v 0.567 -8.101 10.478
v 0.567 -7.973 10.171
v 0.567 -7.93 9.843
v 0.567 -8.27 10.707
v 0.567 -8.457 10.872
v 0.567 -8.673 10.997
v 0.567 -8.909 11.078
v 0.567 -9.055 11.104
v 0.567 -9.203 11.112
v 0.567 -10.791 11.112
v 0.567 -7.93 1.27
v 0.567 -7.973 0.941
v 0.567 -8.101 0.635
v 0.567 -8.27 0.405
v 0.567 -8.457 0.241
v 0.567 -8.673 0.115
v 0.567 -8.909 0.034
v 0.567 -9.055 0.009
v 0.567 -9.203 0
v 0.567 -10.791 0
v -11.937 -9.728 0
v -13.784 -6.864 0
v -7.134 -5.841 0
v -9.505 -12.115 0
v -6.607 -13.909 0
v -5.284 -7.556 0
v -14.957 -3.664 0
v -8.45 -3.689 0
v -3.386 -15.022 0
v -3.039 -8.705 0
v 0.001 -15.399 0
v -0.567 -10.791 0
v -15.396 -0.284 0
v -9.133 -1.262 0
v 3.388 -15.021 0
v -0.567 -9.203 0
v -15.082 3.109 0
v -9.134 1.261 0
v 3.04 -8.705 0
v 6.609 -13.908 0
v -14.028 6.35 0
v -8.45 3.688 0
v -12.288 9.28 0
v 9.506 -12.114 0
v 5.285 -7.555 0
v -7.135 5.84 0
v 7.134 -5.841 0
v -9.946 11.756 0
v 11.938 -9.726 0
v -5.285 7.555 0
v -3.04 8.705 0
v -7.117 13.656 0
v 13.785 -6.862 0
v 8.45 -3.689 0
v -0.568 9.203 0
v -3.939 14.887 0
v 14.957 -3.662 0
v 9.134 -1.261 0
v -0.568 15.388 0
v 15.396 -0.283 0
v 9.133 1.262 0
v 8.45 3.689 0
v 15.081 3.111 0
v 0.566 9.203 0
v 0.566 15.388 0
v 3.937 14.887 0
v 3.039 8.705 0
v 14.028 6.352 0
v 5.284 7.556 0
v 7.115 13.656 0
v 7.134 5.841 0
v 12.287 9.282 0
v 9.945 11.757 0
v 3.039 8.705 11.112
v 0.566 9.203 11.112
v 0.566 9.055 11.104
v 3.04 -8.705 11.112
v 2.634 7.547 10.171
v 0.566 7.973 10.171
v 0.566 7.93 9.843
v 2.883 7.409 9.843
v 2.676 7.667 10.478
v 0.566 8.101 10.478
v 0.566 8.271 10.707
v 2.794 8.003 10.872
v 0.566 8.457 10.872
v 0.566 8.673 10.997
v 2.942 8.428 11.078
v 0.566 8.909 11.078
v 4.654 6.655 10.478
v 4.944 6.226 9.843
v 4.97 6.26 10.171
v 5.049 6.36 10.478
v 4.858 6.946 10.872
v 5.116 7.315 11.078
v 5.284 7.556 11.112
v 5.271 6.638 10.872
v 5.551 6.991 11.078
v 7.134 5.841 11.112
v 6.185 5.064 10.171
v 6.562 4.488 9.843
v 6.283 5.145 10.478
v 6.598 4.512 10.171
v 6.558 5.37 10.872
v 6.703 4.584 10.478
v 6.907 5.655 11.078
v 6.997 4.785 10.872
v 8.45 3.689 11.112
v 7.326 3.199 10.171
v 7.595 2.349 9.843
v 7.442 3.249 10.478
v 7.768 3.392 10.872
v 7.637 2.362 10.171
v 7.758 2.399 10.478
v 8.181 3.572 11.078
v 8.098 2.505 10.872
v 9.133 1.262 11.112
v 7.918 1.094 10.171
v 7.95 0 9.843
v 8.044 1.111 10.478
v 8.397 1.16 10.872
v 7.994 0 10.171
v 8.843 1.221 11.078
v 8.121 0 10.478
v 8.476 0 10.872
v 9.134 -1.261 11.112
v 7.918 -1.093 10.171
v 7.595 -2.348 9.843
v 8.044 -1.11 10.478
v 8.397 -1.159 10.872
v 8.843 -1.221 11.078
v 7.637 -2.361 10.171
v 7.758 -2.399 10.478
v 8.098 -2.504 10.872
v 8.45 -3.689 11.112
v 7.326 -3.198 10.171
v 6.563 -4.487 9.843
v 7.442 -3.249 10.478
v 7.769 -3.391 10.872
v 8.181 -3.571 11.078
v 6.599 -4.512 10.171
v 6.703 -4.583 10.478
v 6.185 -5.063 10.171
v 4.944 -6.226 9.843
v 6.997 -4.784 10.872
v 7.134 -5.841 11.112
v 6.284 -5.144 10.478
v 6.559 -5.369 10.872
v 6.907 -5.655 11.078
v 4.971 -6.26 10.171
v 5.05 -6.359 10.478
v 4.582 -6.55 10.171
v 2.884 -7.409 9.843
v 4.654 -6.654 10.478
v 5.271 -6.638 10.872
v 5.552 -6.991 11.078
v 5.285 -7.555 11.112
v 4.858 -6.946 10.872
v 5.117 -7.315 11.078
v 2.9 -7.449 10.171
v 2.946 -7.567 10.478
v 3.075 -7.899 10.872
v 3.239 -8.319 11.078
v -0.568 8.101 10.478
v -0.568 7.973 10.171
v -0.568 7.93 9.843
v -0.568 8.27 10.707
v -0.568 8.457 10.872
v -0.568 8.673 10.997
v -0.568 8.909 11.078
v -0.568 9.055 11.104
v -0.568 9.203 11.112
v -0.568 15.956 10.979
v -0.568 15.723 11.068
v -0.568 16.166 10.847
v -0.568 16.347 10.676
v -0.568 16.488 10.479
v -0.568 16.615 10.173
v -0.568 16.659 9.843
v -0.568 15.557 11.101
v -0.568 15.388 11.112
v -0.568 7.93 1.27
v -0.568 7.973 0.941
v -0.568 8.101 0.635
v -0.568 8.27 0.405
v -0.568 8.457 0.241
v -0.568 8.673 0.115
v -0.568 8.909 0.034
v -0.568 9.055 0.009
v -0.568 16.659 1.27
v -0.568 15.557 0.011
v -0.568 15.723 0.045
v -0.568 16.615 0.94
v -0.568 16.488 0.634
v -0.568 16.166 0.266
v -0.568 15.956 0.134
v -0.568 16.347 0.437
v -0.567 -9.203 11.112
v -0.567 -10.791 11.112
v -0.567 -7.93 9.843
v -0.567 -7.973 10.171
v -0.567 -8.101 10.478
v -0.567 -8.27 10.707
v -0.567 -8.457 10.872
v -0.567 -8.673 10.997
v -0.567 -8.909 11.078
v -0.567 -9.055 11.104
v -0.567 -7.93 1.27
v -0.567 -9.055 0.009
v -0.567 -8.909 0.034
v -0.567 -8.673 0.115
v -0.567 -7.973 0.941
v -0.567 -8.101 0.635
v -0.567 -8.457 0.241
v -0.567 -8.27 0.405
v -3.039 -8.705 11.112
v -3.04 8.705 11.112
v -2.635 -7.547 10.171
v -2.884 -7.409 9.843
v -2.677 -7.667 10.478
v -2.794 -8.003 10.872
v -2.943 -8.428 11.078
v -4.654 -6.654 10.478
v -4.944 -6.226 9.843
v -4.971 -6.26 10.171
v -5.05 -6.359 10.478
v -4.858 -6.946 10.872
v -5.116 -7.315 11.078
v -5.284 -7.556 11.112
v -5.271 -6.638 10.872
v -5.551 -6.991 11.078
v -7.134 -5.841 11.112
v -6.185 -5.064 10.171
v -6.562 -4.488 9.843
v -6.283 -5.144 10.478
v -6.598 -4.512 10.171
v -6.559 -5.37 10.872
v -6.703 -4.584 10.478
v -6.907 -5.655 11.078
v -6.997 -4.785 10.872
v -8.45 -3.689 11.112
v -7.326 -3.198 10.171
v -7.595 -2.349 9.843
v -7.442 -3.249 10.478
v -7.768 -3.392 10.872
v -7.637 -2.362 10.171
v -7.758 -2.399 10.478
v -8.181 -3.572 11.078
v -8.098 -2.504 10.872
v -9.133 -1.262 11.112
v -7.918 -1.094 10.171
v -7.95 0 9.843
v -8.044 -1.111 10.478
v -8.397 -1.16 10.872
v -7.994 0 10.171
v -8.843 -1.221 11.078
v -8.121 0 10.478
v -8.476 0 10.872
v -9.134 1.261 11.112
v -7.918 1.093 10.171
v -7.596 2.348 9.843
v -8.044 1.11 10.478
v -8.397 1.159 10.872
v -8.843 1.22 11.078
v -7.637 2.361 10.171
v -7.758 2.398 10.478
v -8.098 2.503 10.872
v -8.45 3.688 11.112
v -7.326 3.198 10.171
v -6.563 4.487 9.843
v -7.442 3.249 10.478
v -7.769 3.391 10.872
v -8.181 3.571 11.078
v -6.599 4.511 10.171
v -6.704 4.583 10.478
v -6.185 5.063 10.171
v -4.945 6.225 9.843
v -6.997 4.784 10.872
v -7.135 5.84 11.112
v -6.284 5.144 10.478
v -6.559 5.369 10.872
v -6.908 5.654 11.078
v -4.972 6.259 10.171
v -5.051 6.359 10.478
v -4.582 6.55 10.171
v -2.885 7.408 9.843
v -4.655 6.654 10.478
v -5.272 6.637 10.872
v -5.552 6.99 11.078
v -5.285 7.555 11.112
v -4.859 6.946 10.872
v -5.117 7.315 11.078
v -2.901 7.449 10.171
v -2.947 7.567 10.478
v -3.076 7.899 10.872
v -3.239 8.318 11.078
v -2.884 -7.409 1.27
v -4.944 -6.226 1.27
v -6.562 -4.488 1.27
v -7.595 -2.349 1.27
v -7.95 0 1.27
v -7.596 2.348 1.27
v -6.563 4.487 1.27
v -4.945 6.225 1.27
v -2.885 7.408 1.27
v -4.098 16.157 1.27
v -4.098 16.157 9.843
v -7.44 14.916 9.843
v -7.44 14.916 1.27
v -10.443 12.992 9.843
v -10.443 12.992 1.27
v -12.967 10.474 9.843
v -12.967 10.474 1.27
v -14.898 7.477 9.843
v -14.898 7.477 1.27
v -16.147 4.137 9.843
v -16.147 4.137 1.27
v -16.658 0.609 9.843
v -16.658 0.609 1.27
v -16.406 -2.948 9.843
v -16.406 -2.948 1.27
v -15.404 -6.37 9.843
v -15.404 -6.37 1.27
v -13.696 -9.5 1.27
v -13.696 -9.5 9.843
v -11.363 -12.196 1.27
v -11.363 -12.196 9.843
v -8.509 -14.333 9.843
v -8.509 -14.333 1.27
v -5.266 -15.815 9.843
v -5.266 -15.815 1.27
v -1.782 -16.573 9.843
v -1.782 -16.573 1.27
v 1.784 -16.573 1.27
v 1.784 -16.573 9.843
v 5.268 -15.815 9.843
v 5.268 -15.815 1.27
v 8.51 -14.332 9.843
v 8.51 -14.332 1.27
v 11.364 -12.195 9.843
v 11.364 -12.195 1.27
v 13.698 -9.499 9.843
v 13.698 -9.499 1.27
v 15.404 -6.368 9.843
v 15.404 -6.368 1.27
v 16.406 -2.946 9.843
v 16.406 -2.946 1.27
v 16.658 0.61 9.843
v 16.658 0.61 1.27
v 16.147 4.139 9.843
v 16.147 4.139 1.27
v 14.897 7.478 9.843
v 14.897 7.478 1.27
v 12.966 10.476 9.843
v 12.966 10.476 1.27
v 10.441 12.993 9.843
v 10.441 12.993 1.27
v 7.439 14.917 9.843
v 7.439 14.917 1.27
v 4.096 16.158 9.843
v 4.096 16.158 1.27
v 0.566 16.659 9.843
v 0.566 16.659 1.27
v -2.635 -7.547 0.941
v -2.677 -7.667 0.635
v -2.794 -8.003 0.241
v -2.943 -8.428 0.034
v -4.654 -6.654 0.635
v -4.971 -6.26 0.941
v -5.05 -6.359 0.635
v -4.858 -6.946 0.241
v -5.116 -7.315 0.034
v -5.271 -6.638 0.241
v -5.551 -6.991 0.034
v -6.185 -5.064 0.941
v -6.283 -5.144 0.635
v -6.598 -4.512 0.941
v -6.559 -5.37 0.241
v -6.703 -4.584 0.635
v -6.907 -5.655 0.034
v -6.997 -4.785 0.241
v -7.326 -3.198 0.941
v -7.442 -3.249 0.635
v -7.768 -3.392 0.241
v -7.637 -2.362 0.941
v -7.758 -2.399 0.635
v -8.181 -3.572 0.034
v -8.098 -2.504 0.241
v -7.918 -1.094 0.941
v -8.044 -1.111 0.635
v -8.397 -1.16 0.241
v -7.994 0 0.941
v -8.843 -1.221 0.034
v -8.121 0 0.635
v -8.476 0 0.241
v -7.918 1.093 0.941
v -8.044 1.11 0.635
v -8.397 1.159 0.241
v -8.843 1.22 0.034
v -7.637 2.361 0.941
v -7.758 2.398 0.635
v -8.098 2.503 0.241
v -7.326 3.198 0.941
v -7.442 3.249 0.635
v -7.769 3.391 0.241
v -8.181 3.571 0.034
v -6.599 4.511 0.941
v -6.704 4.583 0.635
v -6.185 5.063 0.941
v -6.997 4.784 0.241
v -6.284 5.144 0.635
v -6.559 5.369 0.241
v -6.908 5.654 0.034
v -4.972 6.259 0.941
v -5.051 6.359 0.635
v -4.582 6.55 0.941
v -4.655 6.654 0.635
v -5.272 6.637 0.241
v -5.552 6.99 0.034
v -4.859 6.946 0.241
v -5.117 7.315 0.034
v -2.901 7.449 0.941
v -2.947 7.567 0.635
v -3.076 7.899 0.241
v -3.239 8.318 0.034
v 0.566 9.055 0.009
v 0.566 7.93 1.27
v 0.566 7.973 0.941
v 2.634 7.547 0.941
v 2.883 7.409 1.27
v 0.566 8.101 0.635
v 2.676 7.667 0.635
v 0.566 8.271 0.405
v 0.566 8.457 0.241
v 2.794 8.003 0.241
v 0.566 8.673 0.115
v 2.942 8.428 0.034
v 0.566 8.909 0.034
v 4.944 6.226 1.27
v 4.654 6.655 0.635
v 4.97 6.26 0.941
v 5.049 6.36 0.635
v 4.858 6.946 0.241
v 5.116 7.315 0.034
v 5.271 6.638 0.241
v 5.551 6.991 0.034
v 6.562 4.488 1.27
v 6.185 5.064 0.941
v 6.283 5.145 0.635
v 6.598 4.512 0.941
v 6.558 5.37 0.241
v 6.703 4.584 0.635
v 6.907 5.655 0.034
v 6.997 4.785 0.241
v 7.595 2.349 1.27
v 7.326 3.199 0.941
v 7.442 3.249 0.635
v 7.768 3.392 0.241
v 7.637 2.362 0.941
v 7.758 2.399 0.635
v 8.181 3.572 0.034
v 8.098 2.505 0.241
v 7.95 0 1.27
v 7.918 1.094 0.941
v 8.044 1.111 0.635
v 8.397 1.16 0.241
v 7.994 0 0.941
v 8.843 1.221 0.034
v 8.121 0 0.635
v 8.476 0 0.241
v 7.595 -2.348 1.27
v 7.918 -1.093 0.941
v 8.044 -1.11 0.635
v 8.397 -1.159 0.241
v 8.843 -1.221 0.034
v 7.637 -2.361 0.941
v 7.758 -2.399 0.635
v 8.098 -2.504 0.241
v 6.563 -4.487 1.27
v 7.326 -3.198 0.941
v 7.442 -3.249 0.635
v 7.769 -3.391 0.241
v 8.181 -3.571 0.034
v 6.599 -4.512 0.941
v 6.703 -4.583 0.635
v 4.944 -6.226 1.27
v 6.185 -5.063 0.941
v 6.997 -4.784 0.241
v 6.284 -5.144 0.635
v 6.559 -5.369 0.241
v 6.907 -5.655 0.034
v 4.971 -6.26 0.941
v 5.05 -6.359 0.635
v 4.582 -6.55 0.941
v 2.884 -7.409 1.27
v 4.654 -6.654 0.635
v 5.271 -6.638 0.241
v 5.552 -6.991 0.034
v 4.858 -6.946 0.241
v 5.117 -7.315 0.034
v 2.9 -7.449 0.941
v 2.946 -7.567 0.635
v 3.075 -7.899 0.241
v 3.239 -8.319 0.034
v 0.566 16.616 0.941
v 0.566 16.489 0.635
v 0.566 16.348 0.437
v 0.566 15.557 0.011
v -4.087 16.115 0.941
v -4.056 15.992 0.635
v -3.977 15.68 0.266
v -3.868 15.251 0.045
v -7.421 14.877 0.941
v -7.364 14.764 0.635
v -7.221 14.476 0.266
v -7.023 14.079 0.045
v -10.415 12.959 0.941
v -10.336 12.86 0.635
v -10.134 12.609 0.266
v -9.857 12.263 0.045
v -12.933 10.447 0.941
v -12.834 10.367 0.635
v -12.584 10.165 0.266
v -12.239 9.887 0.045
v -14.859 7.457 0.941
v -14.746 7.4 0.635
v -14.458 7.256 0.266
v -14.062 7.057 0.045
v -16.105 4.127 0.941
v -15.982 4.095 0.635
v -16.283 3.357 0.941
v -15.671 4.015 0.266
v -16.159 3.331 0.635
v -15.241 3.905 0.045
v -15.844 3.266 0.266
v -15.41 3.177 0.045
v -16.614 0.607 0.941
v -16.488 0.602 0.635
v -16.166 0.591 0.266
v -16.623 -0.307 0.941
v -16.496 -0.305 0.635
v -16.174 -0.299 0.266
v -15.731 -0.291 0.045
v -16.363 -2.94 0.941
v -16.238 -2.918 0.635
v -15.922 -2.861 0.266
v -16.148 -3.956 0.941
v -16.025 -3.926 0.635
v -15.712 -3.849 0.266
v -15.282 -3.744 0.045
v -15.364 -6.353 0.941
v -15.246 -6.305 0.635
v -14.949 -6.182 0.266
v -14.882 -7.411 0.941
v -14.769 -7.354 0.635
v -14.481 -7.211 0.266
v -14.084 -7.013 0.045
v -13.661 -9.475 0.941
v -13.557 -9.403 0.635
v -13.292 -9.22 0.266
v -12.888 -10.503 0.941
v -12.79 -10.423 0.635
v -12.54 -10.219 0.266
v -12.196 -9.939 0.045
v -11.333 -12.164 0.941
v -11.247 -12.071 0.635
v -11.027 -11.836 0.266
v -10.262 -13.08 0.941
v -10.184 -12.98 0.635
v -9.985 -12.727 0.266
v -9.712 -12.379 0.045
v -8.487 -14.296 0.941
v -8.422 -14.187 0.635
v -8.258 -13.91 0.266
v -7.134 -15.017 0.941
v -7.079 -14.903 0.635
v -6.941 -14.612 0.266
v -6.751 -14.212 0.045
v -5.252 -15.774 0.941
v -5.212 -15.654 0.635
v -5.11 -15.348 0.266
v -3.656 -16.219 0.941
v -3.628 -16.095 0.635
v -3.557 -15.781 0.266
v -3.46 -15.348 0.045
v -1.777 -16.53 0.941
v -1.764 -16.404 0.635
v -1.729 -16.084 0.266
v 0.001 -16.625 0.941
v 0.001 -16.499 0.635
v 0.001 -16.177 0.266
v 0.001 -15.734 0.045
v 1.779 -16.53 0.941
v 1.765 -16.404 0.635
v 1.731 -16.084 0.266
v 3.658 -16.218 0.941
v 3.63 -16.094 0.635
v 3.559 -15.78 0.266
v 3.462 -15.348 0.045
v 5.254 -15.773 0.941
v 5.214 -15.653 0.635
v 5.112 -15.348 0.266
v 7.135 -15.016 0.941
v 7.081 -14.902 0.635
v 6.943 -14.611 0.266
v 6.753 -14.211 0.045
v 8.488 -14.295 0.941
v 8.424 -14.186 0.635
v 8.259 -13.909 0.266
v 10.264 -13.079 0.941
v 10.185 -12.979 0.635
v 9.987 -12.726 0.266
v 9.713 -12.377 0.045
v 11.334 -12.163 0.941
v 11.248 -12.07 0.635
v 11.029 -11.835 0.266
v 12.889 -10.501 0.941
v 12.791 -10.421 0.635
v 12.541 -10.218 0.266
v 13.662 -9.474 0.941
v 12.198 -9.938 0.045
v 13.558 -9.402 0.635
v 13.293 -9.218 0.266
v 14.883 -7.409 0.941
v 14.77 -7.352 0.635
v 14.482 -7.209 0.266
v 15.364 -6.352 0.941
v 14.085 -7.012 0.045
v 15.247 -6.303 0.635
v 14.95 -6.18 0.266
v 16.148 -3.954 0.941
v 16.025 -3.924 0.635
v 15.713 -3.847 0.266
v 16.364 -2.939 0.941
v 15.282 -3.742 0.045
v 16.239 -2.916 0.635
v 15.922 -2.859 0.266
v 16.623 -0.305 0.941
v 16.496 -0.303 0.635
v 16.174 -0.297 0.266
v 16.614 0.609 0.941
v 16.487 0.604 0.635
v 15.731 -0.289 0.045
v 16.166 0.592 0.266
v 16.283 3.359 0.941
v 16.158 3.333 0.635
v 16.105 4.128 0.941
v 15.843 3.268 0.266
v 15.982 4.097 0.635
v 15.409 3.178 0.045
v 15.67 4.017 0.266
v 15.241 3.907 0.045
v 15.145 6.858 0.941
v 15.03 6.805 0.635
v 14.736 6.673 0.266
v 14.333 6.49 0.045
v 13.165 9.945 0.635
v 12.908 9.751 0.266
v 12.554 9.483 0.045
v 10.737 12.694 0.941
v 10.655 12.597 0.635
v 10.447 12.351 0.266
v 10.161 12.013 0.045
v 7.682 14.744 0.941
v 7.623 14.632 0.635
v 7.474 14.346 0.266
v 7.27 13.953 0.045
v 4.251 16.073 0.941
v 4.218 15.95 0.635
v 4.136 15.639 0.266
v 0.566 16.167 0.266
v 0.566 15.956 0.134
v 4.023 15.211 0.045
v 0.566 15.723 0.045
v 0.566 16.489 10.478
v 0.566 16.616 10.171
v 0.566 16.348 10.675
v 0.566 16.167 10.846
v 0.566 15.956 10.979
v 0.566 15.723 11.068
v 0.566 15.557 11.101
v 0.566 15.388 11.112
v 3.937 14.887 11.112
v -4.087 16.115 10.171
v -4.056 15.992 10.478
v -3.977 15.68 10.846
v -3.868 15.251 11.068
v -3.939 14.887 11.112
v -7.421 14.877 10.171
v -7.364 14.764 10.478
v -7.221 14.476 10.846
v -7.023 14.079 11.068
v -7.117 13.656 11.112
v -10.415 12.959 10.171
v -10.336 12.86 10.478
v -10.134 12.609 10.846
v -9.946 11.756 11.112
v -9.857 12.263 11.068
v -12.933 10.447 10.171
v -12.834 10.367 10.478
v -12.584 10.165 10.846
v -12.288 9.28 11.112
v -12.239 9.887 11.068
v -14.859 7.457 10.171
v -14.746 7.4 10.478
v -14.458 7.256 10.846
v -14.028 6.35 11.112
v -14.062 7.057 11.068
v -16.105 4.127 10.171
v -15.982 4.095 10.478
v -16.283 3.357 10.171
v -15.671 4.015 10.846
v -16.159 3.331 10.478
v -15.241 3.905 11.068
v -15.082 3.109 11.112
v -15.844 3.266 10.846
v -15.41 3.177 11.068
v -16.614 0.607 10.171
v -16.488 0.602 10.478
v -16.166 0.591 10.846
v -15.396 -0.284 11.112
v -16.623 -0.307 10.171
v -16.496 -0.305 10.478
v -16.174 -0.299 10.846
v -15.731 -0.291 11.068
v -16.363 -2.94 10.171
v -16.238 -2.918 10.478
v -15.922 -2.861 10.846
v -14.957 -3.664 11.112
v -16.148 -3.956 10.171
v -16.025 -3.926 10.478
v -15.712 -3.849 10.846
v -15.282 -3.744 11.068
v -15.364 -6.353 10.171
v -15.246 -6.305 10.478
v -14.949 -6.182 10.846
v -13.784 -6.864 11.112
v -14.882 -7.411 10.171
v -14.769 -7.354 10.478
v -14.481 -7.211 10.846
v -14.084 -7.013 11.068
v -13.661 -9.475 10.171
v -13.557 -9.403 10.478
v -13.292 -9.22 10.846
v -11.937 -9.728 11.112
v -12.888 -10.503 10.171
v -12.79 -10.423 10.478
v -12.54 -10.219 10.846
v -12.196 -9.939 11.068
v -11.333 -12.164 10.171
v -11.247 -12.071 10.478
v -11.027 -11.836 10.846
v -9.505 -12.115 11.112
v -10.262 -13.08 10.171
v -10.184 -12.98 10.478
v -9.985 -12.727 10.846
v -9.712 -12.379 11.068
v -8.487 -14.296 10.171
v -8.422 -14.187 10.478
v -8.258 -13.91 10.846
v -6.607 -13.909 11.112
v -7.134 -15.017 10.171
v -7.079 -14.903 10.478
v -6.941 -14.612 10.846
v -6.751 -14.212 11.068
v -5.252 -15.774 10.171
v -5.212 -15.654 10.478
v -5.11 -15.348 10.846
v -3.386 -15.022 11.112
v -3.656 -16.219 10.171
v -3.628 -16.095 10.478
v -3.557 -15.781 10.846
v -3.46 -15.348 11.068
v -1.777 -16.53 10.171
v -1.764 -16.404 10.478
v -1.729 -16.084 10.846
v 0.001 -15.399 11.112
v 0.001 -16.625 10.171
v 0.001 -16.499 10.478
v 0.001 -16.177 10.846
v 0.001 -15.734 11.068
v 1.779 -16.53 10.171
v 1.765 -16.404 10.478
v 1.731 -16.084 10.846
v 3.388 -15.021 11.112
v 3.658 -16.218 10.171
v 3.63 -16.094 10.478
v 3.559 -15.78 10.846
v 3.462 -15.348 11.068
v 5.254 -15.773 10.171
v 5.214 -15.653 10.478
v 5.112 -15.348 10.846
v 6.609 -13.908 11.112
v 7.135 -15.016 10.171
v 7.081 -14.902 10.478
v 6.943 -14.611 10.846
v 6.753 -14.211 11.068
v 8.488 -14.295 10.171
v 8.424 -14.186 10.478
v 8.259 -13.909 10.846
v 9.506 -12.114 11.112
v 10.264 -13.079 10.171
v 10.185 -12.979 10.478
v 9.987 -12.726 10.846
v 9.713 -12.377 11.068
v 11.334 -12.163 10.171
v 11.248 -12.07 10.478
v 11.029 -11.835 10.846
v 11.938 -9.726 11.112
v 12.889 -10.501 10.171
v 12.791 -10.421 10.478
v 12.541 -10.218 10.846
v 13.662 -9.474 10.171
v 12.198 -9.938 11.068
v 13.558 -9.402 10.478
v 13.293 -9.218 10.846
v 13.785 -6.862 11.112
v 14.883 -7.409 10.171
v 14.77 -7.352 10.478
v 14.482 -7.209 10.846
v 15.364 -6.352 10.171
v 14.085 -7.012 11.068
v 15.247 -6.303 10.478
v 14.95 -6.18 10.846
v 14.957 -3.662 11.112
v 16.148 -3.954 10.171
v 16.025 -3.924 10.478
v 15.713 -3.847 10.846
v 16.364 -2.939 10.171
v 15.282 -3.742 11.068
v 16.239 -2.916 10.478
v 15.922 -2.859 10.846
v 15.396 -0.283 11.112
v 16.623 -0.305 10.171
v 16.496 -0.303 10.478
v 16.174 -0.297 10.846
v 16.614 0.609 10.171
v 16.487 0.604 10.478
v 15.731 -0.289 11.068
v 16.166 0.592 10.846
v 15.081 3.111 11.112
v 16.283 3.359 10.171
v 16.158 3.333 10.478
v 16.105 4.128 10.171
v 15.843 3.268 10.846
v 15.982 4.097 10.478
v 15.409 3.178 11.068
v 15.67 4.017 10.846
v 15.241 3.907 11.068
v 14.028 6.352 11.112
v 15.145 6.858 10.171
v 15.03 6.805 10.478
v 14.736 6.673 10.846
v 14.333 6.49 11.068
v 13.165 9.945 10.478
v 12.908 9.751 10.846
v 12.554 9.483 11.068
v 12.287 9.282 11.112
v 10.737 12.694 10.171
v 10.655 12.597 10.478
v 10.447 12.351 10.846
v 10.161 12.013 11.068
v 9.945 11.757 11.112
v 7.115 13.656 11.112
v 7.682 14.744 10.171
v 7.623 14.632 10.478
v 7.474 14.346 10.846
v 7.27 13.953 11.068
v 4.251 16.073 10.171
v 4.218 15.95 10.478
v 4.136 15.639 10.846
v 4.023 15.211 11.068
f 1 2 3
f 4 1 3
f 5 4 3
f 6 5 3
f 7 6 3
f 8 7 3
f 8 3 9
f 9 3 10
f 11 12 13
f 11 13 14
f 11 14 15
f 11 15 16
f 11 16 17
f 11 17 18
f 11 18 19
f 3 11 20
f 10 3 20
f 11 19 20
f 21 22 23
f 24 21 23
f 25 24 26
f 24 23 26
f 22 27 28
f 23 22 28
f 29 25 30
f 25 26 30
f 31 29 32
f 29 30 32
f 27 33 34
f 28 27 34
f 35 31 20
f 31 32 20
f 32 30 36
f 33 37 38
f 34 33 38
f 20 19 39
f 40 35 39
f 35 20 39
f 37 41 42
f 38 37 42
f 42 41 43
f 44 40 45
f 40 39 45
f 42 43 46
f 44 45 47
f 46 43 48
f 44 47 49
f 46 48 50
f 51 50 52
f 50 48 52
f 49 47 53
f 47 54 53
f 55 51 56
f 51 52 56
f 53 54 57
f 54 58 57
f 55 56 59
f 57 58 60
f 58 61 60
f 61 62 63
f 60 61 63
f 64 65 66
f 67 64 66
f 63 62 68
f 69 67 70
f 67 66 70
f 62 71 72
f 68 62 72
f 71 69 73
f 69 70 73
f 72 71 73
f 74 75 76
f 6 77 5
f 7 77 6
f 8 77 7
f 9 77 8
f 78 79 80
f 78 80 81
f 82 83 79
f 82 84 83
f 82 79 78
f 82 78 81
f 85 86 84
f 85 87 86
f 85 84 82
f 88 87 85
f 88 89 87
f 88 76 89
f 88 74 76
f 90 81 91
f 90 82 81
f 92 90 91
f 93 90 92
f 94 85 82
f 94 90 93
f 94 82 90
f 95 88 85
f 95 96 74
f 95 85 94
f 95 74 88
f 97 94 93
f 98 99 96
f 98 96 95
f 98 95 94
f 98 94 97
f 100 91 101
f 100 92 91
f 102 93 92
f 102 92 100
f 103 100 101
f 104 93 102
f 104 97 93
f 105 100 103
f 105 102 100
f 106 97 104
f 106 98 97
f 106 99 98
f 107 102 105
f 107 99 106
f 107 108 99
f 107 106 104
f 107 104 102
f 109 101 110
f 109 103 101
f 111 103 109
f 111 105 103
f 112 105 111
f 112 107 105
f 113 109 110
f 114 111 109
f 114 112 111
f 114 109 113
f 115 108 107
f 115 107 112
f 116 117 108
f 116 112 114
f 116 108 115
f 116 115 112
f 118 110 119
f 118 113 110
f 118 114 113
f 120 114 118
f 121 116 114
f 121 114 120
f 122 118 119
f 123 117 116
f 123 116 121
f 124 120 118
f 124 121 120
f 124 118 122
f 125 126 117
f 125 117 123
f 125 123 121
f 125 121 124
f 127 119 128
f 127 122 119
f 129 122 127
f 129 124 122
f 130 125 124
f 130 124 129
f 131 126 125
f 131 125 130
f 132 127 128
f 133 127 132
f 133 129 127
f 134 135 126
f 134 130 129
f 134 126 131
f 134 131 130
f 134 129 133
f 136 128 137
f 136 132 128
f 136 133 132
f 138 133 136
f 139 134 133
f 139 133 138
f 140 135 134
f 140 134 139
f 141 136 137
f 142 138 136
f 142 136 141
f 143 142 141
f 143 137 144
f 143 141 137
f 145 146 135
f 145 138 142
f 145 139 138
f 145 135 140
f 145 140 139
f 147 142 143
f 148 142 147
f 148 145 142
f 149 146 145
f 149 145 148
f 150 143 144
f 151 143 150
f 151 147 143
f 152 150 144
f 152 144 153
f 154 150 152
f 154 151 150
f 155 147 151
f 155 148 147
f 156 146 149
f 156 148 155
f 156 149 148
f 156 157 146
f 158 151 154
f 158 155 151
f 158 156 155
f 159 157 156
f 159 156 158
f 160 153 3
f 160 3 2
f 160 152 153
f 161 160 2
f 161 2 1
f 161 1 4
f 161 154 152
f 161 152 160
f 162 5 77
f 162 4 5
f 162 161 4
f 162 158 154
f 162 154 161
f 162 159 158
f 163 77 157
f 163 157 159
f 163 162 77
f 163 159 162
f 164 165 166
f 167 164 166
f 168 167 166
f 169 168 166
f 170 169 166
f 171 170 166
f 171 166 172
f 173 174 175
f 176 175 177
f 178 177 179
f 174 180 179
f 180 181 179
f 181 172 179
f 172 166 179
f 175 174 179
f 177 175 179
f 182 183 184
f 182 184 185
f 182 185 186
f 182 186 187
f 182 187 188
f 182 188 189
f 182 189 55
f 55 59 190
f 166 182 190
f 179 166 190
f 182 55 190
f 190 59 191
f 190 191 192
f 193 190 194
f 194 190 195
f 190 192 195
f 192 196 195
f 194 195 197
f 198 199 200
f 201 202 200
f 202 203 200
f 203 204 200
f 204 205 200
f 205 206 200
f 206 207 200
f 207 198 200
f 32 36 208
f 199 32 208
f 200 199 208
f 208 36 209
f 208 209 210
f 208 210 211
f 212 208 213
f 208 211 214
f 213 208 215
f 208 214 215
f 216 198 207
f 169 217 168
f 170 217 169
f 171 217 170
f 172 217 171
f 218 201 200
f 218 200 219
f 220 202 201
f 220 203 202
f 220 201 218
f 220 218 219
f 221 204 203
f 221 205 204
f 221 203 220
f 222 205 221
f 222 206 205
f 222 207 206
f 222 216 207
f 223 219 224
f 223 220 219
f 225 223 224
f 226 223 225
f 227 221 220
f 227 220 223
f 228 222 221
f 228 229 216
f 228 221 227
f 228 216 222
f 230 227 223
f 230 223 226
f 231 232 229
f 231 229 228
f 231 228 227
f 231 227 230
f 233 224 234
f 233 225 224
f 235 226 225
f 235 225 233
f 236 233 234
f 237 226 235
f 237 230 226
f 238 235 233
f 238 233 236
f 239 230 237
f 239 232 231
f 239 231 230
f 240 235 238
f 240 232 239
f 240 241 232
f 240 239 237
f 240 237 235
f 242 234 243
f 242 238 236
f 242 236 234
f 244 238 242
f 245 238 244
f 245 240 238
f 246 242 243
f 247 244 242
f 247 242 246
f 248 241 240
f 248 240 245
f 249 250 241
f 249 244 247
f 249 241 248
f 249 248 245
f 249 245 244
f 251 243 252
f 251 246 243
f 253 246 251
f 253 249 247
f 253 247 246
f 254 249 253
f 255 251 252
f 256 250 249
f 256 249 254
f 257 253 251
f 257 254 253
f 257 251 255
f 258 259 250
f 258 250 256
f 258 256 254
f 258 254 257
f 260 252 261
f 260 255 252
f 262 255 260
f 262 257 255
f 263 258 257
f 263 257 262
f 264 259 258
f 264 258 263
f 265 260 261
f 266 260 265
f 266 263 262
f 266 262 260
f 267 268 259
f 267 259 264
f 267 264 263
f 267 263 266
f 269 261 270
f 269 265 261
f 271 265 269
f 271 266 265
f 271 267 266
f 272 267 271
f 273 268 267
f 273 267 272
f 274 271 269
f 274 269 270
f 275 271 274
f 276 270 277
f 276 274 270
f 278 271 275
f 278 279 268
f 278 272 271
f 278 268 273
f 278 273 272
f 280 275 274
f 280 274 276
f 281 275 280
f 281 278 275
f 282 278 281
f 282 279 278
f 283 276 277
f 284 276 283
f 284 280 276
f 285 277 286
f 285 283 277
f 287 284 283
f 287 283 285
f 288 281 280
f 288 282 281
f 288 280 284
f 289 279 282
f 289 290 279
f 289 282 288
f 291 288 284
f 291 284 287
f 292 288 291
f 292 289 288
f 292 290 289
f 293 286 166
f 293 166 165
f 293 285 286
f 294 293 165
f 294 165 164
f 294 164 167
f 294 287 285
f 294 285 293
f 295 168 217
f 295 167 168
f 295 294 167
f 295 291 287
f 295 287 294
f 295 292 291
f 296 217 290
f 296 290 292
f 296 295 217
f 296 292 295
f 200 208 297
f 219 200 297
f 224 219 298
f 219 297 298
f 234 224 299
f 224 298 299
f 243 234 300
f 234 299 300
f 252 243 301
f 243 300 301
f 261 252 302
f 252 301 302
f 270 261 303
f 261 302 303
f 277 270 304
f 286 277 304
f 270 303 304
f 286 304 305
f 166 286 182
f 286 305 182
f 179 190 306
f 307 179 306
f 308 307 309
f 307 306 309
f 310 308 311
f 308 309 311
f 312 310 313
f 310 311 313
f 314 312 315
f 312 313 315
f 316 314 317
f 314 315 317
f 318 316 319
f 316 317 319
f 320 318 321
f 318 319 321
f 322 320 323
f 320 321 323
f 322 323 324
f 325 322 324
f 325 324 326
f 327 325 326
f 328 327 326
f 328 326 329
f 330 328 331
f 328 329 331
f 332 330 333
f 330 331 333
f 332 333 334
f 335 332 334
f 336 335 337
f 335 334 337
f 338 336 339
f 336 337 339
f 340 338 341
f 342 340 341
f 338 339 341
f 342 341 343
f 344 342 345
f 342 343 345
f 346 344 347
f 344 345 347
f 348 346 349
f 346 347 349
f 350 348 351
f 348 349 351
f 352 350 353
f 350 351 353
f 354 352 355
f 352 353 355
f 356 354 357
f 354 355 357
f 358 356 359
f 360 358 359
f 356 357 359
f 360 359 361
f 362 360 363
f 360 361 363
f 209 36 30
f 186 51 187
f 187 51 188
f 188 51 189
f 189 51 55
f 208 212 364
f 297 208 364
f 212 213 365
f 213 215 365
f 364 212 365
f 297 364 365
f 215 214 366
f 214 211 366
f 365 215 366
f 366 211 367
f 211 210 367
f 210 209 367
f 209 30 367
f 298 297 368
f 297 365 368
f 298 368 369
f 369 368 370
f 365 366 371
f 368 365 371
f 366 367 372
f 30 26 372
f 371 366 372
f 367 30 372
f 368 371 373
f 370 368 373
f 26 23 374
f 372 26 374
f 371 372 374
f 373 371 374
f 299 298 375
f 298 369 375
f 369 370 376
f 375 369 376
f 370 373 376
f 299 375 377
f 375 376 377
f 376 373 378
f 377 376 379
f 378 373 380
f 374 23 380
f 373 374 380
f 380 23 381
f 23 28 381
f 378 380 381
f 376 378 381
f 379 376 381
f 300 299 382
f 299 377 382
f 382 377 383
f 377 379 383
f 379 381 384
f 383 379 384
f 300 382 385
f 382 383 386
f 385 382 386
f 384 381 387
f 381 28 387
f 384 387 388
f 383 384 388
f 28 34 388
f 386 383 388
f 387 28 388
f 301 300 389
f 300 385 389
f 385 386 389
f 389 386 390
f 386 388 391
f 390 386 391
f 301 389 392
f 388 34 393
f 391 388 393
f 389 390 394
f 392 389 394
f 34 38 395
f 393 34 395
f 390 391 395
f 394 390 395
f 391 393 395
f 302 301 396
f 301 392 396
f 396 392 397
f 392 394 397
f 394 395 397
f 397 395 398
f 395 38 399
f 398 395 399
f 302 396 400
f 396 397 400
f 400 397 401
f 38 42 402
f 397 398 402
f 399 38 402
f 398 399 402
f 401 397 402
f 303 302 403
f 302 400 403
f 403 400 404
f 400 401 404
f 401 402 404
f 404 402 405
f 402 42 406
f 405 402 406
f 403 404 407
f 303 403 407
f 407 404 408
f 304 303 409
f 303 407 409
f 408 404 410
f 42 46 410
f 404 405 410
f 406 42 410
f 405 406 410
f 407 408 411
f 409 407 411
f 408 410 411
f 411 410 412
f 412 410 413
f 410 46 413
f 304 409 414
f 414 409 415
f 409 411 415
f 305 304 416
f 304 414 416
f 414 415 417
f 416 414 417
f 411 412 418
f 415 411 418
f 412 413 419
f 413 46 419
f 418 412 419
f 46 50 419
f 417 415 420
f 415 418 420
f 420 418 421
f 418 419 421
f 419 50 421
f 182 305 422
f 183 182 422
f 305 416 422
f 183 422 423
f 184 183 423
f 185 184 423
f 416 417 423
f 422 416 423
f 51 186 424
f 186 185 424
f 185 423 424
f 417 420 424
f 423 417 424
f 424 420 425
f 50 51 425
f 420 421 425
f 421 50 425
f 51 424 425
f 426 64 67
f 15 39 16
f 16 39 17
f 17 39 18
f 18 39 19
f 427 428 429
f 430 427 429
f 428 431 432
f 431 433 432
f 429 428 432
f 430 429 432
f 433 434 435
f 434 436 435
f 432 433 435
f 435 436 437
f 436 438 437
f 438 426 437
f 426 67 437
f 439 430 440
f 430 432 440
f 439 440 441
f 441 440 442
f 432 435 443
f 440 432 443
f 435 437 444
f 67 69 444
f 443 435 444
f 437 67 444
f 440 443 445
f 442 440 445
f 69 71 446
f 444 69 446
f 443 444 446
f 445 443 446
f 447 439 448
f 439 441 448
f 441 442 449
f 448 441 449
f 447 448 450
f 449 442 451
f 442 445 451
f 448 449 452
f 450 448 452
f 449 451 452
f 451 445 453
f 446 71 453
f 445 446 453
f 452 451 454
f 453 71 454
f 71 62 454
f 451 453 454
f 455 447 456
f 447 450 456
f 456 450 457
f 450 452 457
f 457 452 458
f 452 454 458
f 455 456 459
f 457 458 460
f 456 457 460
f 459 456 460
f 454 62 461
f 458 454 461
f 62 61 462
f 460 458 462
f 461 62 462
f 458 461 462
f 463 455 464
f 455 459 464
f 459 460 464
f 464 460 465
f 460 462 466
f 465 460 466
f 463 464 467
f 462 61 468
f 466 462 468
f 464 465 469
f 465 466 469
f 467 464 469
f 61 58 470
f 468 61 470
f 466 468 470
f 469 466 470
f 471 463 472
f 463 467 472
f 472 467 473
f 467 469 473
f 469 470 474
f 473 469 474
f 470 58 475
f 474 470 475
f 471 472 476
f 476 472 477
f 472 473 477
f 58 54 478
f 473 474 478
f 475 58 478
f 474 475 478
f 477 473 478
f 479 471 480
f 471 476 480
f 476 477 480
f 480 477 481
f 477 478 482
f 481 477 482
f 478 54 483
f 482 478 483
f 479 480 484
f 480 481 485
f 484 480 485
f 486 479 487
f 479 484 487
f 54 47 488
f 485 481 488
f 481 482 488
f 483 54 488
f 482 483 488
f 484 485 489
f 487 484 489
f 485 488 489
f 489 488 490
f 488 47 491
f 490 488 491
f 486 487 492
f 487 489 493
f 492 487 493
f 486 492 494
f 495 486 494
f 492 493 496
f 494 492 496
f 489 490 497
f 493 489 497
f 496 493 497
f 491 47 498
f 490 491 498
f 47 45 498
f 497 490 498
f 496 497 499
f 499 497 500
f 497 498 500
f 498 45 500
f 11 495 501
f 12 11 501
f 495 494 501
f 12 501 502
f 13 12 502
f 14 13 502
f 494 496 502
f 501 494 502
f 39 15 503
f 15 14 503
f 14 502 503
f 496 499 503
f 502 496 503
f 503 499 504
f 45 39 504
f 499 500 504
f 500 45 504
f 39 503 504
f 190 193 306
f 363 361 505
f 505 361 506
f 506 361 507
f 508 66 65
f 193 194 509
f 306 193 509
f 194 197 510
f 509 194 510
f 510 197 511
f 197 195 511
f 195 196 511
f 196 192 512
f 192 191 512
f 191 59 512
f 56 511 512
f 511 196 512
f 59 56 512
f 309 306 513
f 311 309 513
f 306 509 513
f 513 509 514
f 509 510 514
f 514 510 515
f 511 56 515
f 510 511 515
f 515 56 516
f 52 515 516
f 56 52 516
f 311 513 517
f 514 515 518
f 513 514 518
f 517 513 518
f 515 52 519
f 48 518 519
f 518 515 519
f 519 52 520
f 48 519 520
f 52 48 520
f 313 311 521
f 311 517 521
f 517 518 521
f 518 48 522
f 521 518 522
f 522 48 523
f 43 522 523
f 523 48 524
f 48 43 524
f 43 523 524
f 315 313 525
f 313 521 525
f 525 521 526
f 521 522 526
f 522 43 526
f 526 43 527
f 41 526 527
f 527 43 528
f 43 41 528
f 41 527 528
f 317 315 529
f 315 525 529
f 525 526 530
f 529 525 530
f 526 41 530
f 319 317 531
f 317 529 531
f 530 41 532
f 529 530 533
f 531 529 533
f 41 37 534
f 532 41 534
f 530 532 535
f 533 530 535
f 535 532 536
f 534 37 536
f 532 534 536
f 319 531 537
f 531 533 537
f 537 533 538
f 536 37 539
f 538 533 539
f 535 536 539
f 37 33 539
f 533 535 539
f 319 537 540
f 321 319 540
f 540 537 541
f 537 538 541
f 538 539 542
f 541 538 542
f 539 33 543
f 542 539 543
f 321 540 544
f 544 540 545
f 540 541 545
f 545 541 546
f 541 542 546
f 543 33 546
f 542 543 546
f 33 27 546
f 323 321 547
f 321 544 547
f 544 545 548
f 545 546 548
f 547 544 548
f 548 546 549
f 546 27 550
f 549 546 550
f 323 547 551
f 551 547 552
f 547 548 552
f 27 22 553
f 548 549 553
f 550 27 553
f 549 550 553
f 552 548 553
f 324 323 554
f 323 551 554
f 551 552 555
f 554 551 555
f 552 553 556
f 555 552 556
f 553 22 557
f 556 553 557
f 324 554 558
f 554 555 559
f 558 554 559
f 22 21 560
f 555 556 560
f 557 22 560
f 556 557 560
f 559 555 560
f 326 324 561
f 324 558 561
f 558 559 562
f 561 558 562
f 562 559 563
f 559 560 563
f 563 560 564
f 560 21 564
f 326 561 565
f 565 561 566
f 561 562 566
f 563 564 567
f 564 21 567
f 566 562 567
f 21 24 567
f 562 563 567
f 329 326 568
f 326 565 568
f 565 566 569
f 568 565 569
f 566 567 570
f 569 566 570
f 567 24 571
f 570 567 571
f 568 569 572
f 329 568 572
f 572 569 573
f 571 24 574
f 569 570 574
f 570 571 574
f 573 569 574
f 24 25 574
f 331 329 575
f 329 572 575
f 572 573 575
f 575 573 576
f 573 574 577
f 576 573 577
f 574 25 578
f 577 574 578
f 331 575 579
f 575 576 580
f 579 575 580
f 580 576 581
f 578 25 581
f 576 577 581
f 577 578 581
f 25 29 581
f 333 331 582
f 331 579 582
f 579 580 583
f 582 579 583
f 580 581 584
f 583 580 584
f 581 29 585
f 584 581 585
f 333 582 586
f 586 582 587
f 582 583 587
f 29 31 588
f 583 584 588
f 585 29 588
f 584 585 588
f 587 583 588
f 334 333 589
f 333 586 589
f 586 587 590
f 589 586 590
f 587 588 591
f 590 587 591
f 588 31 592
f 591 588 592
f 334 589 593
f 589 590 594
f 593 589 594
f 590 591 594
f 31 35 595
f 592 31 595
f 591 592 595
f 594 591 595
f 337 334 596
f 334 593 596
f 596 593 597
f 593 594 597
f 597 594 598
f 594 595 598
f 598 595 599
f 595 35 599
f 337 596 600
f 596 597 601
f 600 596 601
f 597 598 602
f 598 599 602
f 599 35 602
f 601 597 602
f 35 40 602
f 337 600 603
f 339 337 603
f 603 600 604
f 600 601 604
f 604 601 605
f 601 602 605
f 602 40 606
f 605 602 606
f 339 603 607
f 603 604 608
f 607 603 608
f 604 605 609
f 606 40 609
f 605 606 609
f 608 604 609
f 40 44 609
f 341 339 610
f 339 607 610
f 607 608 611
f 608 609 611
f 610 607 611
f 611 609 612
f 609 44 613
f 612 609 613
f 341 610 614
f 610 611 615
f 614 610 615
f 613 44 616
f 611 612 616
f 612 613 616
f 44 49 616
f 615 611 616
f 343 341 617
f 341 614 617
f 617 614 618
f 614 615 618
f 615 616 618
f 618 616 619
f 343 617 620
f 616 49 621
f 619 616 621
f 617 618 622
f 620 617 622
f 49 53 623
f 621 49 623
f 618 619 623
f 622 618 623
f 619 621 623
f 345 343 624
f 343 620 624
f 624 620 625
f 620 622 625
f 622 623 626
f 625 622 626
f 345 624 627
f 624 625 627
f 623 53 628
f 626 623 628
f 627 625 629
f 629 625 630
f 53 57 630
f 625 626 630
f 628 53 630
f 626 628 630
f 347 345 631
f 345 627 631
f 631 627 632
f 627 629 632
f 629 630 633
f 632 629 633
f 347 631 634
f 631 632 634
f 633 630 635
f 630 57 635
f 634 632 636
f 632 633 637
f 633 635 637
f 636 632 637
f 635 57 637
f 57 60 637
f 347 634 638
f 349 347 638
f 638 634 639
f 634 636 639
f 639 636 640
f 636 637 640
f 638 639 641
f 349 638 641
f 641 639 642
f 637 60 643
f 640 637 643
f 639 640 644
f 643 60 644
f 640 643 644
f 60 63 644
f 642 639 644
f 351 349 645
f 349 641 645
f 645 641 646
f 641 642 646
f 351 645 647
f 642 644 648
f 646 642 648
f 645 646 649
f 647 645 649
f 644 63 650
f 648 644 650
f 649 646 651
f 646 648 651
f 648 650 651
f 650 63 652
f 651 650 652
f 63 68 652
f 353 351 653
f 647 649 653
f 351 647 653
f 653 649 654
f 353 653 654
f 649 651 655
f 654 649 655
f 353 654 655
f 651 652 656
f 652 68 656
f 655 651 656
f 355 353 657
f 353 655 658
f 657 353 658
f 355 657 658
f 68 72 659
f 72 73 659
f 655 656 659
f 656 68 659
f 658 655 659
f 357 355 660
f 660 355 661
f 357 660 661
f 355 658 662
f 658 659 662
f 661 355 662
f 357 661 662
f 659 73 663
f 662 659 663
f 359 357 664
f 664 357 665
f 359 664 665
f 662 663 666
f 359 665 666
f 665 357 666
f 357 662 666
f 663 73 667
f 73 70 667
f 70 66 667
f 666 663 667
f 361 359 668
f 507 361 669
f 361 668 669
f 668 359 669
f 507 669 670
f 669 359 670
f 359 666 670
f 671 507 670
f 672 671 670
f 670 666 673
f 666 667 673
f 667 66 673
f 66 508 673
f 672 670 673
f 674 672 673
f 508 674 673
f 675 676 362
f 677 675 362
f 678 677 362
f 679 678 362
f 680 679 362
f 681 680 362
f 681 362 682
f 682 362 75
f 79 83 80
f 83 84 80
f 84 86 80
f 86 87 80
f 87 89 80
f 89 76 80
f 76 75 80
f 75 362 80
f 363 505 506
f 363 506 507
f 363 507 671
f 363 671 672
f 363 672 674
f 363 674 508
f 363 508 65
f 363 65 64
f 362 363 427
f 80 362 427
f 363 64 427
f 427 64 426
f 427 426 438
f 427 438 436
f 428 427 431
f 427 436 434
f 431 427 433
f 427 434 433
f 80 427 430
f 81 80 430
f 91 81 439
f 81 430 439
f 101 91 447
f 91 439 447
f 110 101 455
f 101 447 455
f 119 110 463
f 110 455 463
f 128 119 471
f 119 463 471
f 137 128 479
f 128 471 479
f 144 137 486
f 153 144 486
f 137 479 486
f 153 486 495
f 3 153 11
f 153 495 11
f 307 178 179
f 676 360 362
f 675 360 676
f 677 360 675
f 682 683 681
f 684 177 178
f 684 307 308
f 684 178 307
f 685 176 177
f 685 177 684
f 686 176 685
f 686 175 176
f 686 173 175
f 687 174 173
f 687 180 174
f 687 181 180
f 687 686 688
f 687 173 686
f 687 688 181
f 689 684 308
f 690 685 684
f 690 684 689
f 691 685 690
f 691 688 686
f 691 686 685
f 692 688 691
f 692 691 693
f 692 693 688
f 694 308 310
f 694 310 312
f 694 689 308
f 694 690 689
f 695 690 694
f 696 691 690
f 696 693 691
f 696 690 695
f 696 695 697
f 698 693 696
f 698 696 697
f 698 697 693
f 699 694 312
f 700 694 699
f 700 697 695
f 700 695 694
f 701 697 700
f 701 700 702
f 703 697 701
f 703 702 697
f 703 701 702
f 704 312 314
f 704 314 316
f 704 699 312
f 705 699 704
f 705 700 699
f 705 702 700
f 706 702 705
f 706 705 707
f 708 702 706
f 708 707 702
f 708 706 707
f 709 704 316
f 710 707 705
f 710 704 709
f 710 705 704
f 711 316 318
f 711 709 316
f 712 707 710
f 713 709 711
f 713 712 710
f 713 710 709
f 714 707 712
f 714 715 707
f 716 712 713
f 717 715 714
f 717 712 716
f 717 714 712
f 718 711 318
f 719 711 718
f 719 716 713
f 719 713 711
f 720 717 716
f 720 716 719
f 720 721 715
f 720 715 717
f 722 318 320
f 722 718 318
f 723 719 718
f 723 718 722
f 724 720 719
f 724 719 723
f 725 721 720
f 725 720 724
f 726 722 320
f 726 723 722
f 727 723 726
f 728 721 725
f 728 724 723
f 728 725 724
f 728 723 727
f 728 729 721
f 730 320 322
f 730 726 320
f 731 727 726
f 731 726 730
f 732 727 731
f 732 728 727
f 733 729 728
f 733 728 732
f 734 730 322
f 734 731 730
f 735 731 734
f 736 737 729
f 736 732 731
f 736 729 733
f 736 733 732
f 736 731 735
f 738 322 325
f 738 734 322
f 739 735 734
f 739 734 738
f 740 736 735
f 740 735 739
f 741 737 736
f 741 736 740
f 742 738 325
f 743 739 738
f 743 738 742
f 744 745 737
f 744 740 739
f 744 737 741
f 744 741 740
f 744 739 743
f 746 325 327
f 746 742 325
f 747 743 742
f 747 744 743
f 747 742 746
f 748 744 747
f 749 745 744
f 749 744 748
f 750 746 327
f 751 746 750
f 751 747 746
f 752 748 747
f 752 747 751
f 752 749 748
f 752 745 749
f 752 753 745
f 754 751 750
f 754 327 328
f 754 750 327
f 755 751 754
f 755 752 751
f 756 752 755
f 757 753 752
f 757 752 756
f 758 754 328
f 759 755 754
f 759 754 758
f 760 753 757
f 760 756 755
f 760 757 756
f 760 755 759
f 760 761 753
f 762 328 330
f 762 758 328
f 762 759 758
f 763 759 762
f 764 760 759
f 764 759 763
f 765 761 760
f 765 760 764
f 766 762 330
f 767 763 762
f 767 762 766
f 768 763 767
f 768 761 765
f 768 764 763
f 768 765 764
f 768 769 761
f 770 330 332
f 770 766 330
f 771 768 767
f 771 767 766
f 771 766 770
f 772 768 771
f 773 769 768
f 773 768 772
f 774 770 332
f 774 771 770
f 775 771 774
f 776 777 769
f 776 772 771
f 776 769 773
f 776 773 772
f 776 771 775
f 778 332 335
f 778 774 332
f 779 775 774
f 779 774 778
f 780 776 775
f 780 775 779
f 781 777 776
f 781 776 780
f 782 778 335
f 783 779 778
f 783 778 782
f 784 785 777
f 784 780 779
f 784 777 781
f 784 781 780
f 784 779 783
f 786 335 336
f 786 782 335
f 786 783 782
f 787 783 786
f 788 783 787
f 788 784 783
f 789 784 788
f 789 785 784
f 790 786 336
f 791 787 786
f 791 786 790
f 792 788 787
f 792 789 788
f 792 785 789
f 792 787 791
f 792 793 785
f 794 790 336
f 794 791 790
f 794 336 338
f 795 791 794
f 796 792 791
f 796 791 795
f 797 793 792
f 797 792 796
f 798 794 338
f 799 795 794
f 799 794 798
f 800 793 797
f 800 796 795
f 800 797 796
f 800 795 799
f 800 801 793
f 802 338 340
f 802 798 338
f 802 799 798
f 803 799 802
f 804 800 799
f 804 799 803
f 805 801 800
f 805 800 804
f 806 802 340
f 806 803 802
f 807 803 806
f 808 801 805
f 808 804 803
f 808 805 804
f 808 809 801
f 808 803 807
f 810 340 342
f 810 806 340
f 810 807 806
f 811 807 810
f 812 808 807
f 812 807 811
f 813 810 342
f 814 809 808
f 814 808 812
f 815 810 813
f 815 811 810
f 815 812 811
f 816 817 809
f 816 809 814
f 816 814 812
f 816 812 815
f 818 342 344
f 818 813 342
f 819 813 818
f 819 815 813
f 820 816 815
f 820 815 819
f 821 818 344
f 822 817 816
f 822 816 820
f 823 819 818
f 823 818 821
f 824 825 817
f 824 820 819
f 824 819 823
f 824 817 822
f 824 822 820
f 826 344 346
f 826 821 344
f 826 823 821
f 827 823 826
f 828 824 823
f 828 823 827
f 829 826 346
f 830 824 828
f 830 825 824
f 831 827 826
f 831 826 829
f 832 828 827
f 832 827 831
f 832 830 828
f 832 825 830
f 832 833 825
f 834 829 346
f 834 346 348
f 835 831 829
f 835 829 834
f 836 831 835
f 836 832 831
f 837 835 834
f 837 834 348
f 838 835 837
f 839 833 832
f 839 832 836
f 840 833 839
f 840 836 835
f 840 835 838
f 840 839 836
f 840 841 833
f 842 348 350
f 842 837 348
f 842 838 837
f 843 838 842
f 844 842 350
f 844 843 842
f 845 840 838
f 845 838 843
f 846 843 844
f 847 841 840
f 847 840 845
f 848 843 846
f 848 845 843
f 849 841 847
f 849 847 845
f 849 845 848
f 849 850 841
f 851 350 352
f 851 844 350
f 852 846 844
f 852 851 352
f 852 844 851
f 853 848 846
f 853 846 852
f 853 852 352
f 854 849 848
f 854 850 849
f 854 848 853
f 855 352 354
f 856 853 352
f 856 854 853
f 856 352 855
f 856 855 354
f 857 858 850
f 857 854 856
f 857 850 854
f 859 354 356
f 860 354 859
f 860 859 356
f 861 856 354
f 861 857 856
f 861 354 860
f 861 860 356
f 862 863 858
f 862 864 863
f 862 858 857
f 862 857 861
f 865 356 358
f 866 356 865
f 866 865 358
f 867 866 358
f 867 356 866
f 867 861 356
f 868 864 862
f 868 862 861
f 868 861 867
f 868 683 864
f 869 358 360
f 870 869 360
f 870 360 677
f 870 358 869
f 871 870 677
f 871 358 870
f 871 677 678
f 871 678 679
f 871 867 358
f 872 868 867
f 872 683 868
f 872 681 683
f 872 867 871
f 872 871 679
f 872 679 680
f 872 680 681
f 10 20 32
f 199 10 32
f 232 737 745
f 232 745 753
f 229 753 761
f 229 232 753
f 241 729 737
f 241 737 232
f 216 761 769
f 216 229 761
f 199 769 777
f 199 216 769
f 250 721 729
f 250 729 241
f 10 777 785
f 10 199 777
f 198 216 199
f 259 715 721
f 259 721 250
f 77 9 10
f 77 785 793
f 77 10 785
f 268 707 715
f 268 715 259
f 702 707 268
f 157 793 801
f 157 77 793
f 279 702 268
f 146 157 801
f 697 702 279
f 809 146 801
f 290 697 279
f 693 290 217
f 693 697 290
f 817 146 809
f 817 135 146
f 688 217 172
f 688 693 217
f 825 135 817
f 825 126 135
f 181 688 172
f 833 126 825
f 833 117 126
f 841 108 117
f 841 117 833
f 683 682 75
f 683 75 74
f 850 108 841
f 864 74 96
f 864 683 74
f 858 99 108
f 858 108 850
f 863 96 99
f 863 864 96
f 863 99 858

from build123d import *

# Parameters (mm, degrees)
F1_DEPTH = 11.1125
F2_R     = 1.27


# Not quite as in the source:
# - a feature names something its author has since deleted; it is built from what else it names


with BuildPart() as f1:
    # F0 (on Top) → F1 (new body)
    with BuildSketch(Plane.XY):
        with BuildLine():
            Line((0.5669642458, -7.9299578551), (0.5669642458, -10.7905164226))
            Line((0.5669642458, -10.7905164226), (-0.5669642458, -10.7905164226))
            Line((-0.5669642458, -10.7905164226), (-0.5669642458, -7.9299578551))
            ThreePointArc((-0.5669642458, -7.9299578551), (-7.950199987, -0.0004547511), (-0.5678714286, 7.9298929426))
            Line((-0.5678714286, 7.9298929426), (-0.5678714286, 16.659074062))
            ThreePointArc((-0.5678714286, 16.659074062), (0.0009076686, -16.6687499753), (0.5660571417, 16.6591358082))
            Line((0.5660571417, 16.6591358082), (0.5660571417, 7.9300226577))
            ThreePointArc((0.5660571417, 7.9300226577), (7.950199987, 0.0004547079), (0.5669642458, -7.9299578551))
        make_face()
    extrude(amount=F1_DEPTH)

    # F2
    f2_edges = [f1.edges().sort_by_distance(p)[0] for p in [
        (-7.9502, -0.000455, 11.1125),
        (-7.9502, -0.000455, 0),
        (0.000908, -16.66875, 11.1125),
        (0.000908, -16.66875, 0),
        (7.9502, 0.000455, 11.1125),
        (7.9502, 0.000455, 0),
    ]]
    fillet(f2_edges, radius=F2_R)


solid = f1.part
